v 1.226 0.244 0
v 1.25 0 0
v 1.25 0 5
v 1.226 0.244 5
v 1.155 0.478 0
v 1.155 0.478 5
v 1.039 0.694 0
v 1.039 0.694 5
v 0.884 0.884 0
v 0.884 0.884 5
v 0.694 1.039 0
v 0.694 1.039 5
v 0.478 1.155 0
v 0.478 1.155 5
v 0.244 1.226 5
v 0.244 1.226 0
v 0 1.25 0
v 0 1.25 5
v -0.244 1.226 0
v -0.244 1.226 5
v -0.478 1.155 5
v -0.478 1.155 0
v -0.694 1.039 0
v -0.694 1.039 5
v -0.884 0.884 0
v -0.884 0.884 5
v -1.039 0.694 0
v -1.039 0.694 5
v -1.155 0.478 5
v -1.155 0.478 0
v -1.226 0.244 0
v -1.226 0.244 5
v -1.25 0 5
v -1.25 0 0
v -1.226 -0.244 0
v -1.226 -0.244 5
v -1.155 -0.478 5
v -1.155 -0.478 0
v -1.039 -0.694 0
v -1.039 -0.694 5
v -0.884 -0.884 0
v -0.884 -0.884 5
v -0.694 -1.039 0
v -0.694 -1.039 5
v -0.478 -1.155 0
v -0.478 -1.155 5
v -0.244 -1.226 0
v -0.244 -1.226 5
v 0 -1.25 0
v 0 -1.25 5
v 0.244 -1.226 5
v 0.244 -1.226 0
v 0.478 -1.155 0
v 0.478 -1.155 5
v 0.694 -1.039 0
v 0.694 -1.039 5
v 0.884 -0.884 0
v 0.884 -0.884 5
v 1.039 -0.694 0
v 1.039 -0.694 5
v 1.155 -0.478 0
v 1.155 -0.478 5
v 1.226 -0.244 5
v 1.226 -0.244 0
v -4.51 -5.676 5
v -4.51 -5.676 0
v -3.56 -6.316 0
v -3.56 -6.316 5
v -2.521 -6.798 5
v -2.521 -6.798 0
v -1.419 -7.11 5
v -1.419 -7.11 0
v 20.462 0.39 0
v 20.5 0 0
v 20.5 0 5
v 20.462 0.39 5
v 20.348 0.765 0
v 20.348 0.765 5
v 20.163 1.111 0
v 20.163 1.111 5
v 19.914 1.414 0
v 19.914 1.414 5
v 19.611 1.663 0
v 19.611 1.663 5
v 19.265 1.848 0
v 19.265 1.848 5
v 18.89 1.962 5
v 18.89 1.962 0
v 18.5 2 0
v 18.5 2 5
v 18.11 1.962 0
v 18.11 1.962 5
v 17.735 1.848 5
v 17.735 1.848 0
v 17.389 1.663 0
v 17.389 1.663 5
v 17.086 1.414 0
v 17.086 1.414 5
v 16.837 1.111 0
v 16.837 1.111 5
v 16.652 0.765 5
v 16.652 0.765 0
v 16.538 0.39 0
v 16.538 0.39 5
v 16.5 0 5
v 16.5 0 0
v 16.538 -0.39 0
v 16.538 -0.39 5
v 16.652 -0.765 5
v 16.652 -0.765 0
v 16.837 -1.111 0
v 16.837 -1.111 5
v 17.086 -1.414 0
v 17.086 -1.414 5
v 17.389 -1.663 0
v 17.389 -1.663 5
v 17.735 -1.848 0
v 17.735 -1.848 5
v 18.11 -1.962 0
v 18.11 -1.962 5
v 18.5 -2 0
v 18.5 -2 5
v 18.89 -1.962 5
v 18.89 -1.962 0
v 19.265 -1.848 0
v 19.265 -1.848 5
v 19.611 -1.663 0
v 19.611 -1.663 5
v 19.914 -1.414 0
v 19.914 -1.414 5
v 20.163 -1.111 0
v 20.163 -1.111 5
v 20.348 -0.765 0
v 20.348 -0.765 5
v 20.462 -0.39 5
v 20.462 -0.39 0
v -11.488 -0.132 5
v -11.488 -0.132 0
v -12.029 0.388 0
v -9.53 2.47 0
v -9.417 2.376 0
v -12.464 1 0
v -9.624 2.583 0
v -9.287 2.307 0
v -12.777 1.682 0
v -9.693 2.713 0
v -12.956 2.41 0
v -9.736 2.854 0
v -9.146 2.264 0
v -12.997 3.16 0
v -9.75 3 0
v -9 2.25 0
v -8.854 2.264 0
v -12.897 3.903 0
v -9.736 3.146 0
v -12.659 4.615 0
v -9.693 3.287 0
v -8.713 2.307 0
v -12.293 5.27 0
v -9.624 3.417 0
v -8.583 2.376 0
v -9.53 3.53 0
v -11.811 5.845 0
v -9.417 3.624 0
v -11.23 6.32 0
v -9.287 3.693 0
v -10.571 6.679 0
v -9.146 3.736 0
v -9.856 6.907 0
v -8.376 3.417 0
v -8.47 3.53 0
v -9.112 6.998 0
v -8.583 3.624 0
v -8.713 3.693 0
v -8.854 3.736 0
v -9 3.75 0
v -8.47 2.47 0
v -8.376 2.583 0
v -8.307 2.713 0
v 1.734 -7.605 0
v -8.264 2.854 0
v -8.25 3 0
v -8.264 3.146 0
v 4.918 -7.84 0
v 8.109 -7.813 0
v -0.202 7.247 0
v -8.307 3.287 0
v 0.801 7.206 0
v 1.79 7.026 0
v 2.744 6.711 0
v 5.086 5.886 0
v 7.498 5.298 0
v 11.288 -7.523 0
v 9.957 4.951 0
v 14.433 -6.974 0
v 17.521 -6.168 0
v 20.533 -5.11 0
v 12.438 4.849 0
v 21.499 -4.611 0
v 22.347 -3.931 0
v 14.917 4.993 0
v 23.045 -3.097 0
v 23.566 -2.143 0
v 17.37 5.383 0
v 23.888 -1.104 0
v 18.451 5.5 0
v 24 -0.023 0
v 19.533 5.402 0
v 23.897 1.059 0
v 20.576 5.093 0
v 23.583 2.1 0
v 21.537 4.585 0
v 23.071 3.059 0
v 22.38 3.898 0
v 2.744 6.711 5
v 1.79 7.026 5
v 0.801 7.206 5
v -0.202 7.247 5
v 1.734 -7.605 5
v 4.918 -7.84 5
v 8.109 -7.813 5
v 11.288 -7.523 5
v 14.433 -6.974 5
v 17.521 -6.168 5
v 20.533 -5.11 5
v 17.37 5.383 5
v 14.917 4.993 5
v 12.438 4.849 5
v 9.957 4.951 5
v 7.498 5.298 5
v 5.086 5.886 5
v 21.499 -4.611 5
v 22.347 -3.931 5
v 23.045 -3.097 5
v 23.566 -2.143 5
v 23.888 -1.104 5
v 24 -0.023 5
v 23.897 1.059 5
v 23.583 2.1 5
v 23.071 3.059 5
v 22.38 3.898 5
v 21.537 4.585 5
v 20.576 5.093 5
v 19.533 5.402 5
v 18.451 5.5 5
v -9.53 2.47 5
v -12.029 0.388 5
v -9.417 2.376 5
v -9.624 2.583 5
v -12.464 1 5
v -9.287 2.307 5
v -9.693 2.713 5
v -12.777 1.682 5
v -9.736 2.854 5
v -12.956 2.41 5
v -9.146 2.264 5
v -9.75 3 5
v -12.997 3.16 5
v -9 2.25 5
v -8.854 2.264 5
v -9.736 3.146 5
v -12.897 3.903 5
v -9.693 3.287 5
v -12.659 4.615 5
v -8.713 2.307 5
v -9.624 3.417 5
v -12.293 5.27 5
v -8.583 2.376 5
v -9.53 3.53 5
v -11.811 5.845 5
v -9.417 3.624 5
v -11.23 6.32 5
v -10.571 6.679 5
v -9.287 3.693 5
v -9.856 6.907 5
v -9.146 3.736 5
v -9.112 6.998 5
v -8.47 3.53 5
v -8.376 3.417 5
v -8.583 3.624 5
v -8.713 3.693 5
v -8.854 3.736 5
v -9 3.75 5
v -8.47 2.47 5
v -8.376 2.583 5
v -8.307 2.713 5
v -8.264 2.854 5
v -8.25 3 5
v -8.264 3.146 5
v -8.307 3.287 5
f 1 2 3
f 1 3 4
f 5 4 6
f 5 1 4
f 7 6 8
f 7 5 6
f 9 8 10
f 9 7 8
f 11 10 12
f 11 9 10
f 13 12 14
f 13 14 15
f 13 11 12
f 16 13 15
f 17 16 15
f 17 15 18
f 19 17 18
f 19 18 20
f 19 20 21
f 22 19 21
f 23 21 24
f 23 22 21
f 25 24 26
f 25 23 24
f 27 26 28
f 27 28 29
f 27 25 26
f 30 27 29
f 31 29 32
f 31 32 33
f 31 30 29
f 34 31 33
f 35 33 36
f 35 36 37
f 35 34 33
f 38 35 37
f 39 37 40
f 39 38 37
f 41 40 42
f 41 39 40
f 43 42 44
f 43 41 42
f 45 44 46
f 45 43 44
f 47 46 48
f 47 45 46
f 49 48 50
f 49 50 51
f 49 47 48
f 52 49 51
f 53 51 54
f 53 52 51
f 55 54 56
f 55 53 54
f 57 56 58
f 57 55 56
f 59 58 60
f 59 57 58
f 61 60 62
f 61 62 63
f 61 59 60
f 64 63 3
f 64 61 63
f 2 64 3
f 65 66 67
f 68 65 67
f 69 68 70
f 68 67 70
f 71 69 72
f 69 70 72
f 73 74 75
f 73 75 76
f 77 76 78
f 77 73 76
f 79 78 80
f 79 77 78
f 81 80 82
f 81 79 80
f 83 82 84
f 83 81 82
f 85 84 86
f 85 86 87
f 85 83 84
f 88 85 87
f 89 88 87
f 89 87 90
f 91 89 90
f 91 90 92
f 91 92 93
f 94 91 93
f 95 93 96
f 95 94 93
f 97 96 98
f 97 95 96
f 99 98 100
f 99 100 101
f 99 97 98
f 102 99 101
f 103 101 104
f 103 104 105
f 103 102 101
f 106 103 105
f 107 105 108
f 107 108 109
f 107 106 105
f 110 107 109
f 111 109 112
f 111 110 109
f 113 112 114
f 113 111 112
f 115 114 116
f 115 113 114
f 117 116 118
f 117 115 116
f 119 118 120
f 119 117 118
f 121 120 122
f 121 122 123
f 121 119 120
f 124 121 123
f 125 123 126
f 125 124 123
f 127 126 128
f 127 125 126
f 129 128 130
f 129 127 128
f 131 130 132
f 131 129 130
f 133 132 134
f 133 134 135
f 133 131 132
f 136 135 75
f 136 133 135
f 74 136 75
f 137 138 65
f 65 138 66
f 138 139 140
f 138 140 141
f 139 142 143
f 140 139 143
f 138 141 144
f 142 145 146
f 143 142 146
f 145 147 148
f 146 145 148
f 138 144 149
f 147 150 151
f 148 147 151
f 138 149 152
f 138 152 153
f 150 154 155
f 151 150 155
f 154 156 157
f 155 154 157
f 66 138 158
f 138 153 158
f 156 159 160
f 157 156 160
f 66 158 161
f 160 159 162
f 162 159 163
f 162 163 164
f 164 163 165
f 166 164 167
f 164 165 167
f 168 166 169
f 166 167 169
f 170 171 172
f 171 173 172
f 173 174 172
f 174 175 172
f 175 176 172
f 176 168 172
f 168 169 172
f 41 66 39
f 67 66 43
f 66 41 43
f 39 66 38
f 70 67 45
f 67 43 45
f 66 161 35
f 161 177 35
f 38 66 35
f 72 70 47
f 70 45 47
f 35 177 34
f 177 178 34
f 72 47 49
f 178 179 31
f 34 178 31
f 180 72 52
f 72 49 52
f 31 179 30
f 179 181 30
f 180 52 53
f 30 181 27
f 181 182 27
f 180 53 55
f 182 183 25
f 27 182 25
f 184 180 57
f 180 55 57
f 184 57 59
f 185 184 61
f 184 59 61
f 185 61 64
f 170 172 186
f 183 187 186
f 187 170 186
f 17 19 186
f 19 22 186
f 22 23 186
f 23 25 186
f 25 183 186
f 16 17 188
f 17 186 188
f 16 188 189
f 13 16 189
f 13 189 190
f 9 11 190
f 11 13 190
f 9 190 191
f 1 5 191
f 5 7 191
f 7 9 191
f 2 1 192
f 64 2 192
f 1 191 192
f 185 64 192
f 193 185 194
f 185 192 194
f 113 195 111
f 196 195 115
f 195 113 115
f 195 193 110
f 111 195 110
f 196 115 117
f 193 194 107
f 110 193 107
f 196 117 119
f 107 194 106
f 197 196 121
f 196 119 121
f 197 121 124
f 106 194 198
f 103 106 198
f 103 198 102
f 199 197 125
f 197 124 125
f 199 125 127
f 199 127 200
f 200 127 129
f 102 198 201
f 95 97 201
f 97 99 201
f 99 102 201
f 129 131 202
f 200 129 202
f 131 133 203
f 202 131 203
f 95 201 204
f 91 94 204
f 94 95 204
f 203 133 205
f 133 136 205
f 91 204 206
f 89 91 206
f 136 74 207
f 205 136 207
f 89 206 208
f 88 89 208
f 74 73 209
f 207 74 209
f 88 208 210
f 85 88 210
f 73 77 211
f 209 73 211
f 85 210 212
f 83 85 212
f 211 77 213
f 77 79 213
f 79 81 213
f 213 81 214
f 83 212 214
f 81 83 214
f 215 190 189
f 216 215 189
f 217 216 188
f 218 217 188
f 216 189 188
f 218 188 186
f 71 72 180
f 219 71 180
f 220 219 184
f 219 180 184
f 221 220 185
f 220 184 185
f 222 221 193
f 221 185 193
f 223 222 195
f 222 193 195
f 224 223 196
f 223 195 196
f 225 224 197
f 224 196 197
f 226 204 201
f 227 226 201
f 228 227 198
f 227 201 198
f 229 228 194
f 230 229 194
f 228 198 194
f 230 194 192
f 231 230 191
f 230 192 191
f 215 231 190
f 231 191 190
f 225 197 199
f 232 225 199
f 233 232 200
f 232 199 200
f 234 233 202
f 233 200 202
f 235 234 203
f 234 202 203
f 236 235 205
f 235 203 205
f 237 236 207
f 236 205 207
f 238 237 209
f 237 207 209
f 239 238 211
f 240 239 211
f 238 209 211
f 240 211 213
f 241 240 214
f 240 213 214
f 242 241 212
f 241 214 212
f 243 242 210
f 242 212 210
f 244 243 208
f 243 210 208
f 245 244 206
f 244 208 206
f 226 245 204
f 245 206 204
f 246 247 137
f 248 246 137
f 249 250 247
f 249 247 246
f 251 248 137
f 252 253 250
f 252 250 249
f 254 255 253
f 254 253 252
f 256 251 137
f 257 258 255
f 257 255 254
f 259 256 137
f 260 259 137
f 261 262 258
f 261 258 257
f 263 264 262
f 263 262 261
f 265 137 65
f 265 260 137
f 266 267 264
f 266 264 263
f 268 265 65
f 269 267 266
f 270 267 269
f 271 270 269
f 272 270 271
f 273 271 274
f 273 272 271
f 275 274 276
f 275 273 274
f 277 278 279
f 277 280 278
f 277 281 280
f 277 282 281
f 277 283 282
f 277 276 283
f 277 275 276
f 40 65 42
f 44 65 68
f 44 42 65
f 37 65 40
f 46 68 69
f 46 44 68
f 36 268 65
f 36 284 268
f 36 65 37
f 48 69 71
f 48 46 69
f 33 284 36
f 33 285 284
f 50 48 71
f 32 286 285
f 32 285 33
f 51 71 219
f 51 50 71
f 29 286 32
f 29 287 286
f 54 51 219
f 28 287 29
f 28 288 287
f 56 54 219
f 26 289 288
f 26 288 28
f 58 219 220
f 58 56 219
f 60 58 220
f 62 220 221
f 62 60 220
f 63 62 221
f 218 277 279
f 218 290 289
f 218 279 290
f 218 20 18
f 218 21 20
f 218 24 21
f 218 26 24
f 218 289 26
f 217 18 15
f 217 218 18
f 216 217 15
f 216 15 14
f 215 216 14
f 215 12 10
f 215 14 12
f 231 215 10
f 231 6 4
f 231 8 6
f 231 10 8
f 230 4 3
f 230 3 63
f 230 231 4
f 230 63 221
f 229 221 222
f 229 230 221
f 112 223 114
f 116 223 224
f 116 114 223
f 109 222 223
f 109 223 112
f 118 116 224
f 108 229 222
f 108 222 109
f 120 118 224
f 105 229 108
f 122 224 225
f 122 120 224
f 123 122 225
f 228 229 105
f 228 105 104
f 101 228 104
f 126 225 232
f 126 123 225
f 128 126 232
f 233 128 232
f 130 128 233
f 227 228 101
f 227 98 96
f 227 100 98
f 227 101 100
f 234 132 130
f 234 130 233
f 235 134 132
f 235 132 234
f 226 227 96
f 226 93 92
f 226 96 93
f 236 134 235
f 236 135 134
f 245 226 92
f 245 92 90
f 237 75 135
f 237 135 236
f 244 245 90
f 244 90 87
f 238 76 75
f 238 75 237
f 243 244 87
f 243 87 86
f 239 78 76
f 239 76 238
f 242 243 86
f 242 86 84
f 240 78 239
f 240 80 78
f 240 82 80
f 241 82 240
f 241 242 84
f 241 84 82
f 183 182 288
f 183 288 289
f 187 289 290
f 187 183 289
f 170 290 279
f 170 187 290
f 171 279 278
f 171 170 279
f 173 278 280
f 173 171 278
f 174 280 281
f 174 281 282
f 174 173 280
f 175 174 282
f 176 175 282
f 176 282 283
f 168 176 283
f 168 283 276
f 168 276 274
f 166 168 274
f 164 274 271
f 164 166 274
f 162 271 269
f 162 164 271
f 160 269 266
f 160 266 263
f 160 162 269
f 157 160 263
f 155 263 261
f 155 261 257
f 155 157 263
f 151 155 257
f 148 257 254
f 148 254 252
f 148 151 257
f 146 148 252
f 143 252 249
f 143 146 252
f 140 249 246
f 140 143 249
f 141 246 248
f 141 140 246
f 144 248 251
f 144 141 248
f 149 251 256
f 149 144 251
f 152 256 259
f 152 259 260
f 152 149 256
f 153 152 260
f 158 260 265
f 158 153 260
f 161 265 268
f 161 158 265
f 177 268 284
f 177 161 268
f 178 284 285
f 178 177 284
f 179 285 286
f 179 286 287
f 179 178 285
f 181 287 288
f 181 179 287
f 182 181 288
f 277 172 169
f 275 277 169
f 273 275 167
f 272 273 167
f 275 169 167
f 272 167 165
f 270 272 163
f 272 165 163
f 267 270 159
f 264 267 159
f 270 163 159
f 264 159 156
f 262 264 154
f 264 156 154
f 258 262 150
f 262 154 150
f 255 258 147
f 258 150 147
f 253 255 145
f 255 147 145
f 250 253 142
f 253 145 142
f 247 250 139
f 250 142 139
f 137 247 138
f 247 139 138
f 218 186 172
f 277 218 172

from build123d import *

# Parameters (mm, degrees)
SKETCH1_R           = 1.25
SKETCH1_R_2         = 2
SKETCH1_R_3         = 0.75
BOSS_EXTRUDE1_DEPTH = 5


with BuildPart() as part:
    # Sketch1 → Boss-Extrude1 (new body)
    with BuildSketch(Plane.XY):
        with BuildLine():
            Line((-11.488369565, -0.131775361), (-4.510169836, -5.676342841))
            ThreePointArc((-4.510169836, -5.676342841), (-3.050109649, -6.577182613), (-1.419255622, -7.109726681))
            ThreePointArc((-1.419255622, -7.109726681), (9.701935293, -7.700842906), (20.533350493, -5.110331278))
            ThreePointArc((20.533350493, -5.110331278), (23.765864573, 1.587661896), (17.36972181, 5.382608217))
            ThreePointArc((17.36972181, 5.382608217), (9.957149012, 4.950641907), (2.743644121, 6.710805983))
            ThreePointArc((2.743644121, 6.710805983), (1.298650223, 7.132741941), (-0.202330164, 7.247176175))
            Line((-0.202330164, 7.247176175), (-9.111630435, 6.998442027))
            ThreePointArc((-9.111630435, 6.998442027), (-12.794733192, 4.264911064), (-11.488369565, -0.131775361))
        make_face()
        Circle(SKETCH1_R, mode=Mode.SUBTRACT)
        with Locations((18.5, 0)):
            Circle(SKETCH1_R_2, mode=Mode.SUBTRACT)
        with Locations((-9, 3)):
            Circle(SKETCH1_R_3, mode=Mode.SUBTRACT)
    extrude(amount=BOSS_EXTRUDE1_DEPTH)


solid = part.part
